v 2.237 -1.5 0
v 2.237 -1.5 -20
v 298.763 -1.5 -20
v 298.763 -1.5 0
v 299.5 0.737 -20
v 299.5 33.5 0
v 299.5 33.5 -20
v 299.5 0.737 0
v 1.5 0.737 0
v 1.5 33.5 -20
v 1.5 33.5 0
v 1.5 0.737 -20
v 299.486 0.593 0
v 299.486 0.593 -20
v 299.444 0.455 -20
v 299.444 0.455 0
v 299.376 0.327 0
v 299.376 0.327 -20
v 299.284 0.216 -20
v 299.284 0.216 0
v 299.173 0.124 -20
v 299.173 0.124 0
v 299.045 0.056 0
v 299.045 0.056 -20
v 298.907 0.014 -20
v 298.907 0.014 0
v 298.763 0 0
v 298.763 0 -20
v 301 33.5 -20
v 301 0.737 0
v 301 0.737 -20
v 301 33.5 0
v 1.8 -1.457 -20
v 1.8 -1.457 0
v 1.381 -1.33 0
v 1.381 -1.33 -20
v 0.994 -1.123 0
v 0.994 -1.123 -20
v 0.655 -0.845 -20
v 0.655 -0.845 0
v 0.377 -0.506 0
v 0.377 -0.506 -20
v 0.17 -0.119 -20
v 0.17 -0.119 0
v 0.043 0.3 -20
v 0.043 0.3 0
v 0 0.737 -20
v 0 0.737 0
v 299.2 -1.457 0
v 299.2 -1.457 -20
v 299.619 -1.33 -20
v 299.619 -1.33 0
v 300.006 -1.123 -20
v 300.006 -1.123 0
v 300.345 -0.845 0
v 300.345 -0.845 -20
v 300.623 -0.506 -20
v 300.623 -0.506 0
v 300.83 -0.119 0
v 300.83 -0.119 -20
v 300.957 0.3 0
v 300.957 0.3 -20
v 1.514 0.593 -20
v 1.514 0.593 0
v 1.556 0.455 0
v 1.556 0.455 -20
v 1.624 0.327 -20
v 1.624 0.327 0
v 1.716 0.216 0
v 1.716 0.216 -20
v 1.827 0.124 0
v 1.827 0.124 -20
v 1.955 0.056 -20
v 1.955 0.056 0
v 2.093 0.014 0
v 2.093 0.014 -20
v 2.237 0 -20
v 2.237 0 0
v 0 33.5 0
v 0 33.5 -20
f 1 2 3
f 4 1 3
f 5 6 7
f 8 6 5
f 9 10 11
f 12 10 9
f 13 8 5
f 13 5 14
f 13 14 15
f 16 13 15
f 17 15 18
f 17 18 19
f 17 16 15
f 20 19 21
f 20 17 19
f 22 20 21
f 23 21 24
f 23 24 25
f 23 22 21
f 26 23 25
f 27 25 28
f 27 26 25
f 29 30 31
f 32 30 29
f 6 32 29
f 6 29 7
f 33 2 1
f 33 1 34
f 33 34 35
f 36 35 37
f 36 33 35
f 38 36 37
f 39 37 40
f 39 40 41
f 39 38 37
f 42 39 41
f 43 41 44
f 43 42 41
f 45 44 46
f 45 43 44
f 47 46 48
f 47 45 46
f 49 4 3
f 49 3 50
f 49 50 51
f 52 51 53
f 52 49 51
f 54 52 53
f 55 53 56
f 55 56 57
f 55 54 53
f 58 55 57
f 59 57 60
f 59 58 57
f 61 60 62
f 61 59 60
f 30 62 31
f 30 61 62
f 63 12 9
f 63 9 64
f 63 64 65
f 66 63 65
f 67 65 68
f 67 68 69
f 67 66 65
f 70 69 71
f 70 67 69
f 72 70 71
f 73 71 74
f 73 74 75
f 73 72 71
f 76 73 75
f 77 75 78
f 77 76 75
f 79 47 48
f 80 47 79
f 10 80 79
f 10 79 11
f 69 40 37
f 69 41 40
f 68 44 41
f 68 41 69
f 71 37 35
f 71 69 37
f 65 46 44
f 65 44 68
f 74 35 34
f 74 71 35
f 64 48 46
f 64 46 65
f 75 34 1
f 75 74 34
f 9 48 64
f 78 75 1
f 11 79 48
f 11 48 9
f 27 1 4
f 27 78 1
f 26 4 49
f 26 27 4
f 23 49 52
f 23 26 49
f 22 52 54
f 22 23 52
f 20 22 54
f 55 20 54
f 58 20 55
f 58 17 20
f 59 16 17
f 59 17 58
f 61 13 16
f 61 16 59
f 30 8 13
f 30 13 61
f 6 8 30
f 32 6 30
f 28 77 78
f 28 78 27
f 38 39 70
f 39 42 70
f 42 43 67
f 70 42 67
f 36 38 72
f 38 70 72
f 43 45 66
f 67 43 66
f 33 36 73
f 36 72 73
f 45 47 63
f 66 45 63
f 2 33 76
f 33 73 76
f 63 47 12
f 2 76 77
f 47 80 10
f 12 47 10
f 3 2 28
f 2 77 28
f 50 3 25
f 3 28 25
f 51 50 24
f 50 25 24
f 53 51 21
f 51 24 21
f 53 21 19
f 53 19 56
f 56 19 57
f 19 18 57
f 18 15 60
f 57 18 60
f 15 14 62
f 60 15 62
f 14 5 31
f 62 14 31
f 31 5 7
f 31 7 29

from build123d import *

# Parameters (mm, degrees)
SKETCH_1_W                       = 301
SKETCH_1_H                       = 20
SM_BASE_FLANGE_1_DEPTH           = 1.5
SM_EDGE_FLANGE_1_STRIP_W         = 7.4732
SM_EDGE_FLANGE_1_STRIP_H         = 1.5
SM_EDGE_FLANGE_1_STRIP_CUT_DEPTH = 20
SM_EDGE_FLANGE_1_DEPTH           = 20
SM_EDGE_FLANGE_2_STRIP_W         = 7.4732
SM_EDGE_FLANGE_2_STRIP_H         = 1.5
SM_EDGE_FLANGE_2_STRIP_CUT_DEPTH = 20
SM_EDGE_FLANGE_2_DEPTH           = 20


# Sheet-metal steps are written as plain solids
with BuildPart() as part:
    # Sketch 1 → Базовая кромка1 (new body)
    with BuildSketch(Plane(origin=(0, 0, 0), x_dir=(1, 0, 0), z_dir=(0, 1, 0))):
        with Locations((150.5, 10)):
            Rectangle(SKETCH_1_W, SKETCH_1_H)
    extrude(amount=-SM_BASE_FLANGE_1_DEPTH)

    # Ребро-кромка1 strip (across the edge) → Ребро-кромка1 strip cut (cut)
    with BuildSketch(Plane.XY.offset(-20)):
        with Locations((-1.5, -0.75)):
            Rectangle(SM_EDGE_FLANGE_1_STRIP_W, SM_EDGE_FLANGE_1_STRIP_H)
    extrude(amount=SM_EDGE_FLANGE_1_STRIP_CUT_DEPTH, mode=Mode.SUBTRACT)

    # Ребро-кромка1 section (across the edge) → Ребро-кромка1 (add)
    with BuildSketch(Plane.XY.offset(-20)):
        with BuildLine():
            Line((0, 0.7366), (0, 33.5))
            Line((0, 33.5), (1.5, 33.5))
            Line((1.5, 33.5), (1.5, 0.7366))
            ThreePointArc((1.5, 0.7366), (1.715745145, 0.215745145), (2.2366, 0))
            Line((2.2366, 0), (2.2366, -1.5))
            ThreePointArc((2.2366, -1.5), (0.655084973, -0.844915027), (0, 0.7366))
        make_face()
    extrude(amount=SM_EDGE_FLANGE_1_DEPTH)

    # Ребро-кромка2 strip (across the edge) → Ребро-кромка2 strip cut (cut)
    with BuildSketch(Plane(origin=(301, 0, 0), x_dir=(-1, 0, 0), z_dir=(0, 0, -1))):
        with Locations((-1.5, -0.75)):
            Rectangle(SM_EDGE_FLANGE_2_STRIP_W, SM_EDGE_FLANGE_2_STRIP_H)
    extrude(amount=SM_EDGE_FLANGE_2_STRIP_CUT_DEPTH, mode=Mode.SUBTRACT)

    # Ребро-кромка2 section (across the edge) → Ребро-кромка2 (add)
    with BuildSketch(Plane(origin=(301, 0, 0), x_dir=(-1, 0, 0), z_dir=(0, 0, -1))):
        with BuildLine():
            Line((0, 0.7366), (0, 33.5))
            Line((0, 33.5), (1.5, 33.5))
            Line((1.5, 33.5), (1.5, 0.7366))
            ThreePointArc((1.5, 0.7366), (1.715745145, 0.215745145), (2.2366, 0))
            Line((2.2366, 0), (2.2366, -1.5))
            ThreePointArc((2.2366, -1.5), (0.655084973, -0.844915027), (0, 0.7366))
        make_face()
    extrude(amount=SM_EDGE_FLANGE_2_DEPTH)


solid = part.part
